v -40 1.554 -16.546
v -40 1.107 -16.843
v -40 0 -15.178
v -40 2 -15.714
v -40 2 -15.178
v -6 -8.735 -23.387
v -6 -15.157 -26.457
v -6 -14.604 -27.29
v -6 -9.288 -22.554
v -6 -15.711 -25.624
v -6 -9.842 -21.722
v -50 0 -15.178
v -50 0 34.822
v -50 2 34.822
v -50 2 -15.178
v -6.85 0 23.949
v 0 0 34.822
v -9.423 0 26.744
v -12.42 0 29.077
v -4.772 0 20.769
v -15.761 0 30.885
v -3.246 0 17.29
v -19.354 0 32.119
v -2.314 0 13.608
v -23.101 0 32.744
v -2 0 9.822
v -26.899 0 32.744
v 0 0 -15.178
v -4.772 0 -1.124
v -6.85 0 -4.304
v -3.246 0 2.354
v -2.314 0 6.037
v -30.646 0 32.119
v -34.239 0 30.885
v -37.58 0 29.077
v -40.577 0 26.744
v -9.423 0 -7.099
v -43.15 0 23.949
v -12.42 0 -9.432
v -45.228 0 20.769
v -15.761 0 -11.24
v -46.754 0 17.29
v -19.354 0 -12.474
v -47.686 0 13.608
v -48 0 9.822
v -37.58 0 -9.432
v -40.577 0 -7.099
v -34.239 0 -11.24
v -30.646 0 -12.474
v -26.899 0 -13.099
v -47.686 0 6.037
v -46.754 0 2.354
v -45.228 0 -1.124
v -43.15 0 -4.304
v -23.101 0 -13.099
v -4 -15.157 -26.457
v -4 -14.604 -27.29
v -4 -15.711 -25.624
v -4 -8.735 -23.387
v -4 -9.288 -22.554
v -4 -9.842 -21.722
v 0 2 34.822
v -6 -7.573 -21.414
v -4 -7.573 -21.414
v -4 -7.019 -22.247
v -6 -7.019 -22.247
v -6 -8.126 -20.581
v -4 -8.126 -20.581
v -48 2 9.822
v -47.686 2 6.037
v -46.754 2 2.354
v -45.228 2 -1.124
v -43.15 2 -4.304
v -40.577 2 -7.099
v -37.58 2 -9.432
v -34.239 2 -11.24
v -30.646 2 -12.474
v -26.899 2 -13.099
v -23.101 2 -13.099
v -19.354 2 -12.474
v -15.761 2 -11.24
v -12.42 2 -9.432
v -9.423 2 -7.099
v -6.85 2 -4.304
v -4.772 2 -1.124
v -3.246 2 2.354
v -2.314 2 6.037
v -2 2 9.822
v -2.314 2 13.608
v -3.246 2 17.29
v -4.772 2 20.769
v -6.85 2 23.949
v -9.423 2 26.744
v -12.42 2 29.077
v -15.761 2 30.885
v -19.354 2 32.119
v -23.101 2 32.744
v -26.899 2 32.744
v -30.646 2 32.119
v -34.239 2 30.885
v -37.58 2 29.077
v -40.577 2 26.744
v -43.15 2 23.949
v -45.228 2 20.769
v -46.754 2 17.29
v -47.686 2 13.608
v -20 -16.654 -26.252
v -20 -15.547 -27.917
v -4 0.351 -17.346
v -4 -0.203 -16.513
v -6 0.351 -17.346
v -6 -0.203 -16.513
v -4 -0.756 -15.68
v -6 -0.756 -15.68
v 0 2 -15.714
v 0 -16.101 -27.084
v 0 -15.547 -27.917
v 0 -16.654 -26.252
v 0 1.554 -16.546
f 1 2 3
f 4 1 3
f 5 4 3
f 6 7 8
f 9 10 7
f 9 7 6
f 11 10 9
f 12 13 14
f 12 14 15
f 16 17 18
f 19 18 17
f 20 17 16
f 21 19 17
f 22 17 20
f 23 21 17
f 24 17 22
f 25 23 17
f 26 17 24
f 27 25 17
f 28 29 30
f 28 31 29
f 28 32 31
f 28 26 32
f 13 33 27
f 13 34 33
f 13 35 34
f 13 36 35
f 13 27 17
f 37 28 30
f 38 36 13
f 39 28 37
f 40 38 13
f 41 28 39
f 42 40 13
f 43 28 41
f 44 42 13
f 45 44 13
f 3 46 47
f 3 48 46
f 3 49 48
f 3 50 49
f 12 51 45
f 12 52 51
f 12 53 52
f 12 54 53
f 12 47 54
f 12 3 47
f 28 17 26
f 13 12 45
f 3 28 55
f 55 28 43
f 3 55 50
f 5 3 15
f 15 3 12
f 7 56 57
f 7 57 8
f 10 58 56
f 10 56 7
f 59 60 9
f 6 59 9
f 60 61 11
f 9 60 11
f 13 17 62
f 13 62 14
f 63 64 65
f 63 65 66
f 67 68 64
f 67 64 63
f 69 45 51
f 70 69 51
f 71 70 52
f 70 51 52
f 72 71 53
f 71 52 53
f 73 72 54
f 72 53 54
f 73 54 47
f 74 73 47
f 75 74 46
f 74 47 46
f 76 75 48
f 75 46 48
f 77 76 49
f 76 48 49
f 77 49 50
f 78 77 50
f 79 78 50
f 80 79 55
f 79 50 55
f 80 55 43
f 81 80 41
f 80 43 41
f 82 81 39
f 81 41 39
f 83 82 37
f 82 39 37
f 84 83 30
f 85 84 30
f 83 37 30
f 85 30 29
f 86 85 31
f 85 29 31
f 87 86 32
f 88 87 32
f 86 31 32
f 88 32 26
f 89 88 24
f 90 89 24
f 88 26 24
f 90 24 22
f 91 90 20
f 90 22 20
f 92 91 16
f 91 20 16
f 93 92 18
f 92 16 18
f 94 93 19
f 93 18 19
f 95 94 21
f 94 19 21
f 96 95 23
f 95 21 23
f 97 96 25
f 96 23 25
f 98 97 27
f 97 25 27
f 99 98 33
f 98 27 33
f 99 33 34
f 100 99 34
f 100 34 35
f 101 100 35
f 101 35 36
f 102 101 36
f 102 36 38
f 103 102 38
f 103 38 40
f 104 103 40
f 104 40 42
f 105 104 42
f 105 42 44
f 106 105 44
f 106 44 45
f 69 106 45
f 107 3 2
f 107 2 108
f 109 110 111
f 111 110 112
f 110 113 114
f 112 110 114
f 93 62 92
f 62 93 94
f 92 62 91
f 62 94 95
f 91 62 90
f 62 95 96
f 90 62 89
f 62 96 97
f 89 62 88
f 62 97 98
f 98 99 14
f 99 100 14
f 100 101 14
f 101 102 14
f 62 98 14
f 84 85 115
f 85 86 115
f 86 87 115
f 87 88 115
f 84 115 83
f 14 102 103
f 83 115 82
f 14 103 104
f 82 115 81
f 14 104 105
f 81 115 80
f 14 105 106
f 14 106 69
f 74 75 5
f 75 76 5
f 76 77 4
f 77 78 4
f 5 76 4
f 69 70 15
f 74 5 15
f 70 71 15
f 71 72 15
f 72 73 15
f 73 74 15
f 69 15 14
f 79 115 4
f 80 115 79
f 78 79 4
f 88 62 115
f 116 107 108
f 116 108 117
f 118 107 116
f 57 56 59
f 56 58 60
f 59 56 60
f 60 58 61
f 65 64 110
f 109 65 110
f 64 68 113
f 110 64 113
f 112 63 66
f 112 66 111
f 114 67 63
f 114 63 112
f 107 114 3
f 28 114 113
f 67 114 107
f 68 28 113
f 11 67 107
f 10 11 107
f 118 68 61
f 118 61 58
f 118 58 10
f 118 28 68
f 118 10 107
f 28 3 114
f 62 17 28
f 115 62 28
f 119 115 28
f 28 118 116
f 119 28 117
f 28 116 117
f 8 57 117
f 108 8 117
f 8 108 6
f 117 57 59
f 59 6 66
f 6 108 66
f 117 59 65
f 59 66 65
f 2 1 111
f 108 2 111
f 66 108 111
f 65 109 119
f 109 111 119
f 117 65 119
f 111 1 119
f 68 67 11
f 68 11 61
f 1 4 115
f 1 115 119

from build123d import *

# Parameters (mm, degrees)
SKETCH1_W           = 40
SKETCH1_H           = 40
SKETCH1_R           = 19
BOSS_EXTRUDE1_DEPTH = 1
BOSS_EXTRUDE3_DEPTH = 40
CUT_EXTRUDE1_DEPTH  = 40
SKETCH4_W           = 2
SKETCH4_H           = 17.959199538
CUT_EXTRUDE2_DEPTH  = 40
SKETCH5_W           = 4.291289536
SKETCH5_H           = 2.060082618
BOSS_EXTRUDE4_DEPTH = 1
SKETCH6_W           = 40
SKETCH6_H           = 40.535957941
SKETCH6_R           = 19
BOSS_EXTRUDE5_DEPTH = 1
SKETCH7_W           = 2
SKETCH7_H           = 8.850816201
SKETCH7_H_2         = 7.048300719
BOSS_EXTRUDE6_DEPTH = 1
BOSS_EXTRUDE7_DEPTH = 40
SKETCH9_W           = 50
SKETCH9_H           = 50
BOSS_EXTRUDE8_DEPTH = 2
SKETCH10_R          = 23
CUT_EXTRUDE3_DEPTH  = 2


with BuildPart() as part:
    # Sketch1 → Boss-Extrude1 (new body)
    with BuildSketch(Plane(origin=(0, 0, 0), x_dir=(1, 0, 0), z_dir=(0, 1, 0))):
        with Locations((-20, -4.822405003)):
            Rectangle(SKETCH1_W, SKETCH1_H)
        with Locations((-20, -4.822405003)):
            Circle(SKETCH1_R, mode=Mode.SUBTRACT)
    extrude(amount=BOSS_EXTRUDE1_DEPTH)

    # Sketch2 → Boss-Extrude3 (add)
    with BuildSketch(Plane(origin=(0, 0, 0), x_dir=(0, 0, -1), z_dir=(1, 0, 0))):
        Polygon((15.177594997, 0), (26.251567878, -16.654342515), (27.084285004, -16.100643871), (15.713552938, 1), (15.177594997, 1), align=None)
    extrude(amount=-BOSS_EXTRUDE3_DEPTH)

    # Sketch3 → Cut-Extrude1 (cut)
    with BuildSketch(Plane(origin=(0, 6.997999648, -10.524414707), x_dir=(1, 0, 0), z_dir=(0, -0.553698644, 0.832717126))):
        Polygon((-20, -28.40381377), (-40, -8.40381377), (-40, -28.40381377), align=None)
    extrude(amount=-CUT_EXTRUDE1_DEPTH, mode=Mode.SUBTRACT)

    # Sketch4 → Cut-Extrude2 (cut)
    with BuildSketch(Plane(origin=(0, 6.997999648, -10.524414707), x_dir=(1, 0, 0), z_dir=(0, -0.553698644, 0.832717126))):
        with Locations((-5, -18.291545123)):
            Rectangle(SKETCH4_W, SKETCH4_H)
    extrude(amount=-CUT_EXTRUDE2_DEPTH, mode=Mode.SUBTRACT)

    # Sketch5 → Boss-Extrude4 (add)
    with BuildSketch(Plane(origin=(0, 6.997999648, -10.524414707), x_dir=(1, 0, 0), z_dir=(0, -0.553698644, 0.832717126))):
        with Locations((-5.191272024, -19.192802864)):
            Rectangle(SKETCH5_W, SKETCH5_H)
    extrude(amount=-BOSS_EXTRUDE4_DEPTH)

    # Sketch6 → Boss-Extrude5 (add)
    with BuildSketch(Plane(origin=(0, 1, 0), x_dir=(1, 0, 0), z_dir=(0, 1, 0))):
        with Locations((-20, -4.554426032)):
            Rectangle(SKETCH6_W, SKETCH6_H)
        with Locations((-20, -4.822405003)):
            Circle(SKETCH6_R, mode=Mode.SUBTRACT)
    extrude(amount=BOSS_EXTRUDE5_DEPTH)

    # Sketch7 → Boss-Extrude6 (add)
    with BuildSketch(Plane(origin=(0, 7.551698292, -11.357131833), x_dir=(-1, 0, 0), z_dir=(0, 0.553698644, -0.832717126))):
        Polygon((40, -7.867855829), (40, -8.40381377), (20, -28.40381377), (0, -28.40381377), (0, -7.867855829), align=None)
        with Locations((5, -13.737353454)):
            Rectangle(SKETCH7_W, SKETCH7_H, mode=Mode.SUBTRACT)
        with Locations((5, -23.746994533)):
            Rectangle(SKETCH7_W, SKETCH7_H_2, mode=Mode.SUBTRACT)
    extrude(amount=BOSS_EXTRUDE6_DEPTH)

    # Sketch8 → Boss-Extrude7 (add)
    with BuildSketch(Plane(origin=(0, 0, 0), x_dir=(0, 0, -1), z_dir=(1, 0, 0))):
        Polygon((15.713552938, 2), (16.546270063, 1.553698644), (15.713552938, 1), align=None)
    extrude(amount=-BOSS_EXTRUDE7_DEPTH)

    # Sketch9 → Boss-Extrude8 (add)
    with BuildSketch(Plane(origin=(0, 0, 0), x_dir=(-1, 0, 0), z_dir=(0, -1, 0))):
        with Locations((25, -9.822405003)):
            Rectangle(SKETCH9_W, SKETCH9_H)
    extrude(amount=-BOSS_EXTRUDE8_DEPTH)

    # Sketch10 → Cut-Extrude3 (cut)
    with BuildSketch(Plane(origin=(0, 0, 0), x_dir=(-1, 0, 0), z_dir=(0, -1, 0))):
        with Locations((25, -9.822405003)):
            Circle(SKETCH10_R)
    extrude(amount=-CUT_EXTRUDE3_DEPTH, mode=Mode.SUBTRACT)


solid = part.part
